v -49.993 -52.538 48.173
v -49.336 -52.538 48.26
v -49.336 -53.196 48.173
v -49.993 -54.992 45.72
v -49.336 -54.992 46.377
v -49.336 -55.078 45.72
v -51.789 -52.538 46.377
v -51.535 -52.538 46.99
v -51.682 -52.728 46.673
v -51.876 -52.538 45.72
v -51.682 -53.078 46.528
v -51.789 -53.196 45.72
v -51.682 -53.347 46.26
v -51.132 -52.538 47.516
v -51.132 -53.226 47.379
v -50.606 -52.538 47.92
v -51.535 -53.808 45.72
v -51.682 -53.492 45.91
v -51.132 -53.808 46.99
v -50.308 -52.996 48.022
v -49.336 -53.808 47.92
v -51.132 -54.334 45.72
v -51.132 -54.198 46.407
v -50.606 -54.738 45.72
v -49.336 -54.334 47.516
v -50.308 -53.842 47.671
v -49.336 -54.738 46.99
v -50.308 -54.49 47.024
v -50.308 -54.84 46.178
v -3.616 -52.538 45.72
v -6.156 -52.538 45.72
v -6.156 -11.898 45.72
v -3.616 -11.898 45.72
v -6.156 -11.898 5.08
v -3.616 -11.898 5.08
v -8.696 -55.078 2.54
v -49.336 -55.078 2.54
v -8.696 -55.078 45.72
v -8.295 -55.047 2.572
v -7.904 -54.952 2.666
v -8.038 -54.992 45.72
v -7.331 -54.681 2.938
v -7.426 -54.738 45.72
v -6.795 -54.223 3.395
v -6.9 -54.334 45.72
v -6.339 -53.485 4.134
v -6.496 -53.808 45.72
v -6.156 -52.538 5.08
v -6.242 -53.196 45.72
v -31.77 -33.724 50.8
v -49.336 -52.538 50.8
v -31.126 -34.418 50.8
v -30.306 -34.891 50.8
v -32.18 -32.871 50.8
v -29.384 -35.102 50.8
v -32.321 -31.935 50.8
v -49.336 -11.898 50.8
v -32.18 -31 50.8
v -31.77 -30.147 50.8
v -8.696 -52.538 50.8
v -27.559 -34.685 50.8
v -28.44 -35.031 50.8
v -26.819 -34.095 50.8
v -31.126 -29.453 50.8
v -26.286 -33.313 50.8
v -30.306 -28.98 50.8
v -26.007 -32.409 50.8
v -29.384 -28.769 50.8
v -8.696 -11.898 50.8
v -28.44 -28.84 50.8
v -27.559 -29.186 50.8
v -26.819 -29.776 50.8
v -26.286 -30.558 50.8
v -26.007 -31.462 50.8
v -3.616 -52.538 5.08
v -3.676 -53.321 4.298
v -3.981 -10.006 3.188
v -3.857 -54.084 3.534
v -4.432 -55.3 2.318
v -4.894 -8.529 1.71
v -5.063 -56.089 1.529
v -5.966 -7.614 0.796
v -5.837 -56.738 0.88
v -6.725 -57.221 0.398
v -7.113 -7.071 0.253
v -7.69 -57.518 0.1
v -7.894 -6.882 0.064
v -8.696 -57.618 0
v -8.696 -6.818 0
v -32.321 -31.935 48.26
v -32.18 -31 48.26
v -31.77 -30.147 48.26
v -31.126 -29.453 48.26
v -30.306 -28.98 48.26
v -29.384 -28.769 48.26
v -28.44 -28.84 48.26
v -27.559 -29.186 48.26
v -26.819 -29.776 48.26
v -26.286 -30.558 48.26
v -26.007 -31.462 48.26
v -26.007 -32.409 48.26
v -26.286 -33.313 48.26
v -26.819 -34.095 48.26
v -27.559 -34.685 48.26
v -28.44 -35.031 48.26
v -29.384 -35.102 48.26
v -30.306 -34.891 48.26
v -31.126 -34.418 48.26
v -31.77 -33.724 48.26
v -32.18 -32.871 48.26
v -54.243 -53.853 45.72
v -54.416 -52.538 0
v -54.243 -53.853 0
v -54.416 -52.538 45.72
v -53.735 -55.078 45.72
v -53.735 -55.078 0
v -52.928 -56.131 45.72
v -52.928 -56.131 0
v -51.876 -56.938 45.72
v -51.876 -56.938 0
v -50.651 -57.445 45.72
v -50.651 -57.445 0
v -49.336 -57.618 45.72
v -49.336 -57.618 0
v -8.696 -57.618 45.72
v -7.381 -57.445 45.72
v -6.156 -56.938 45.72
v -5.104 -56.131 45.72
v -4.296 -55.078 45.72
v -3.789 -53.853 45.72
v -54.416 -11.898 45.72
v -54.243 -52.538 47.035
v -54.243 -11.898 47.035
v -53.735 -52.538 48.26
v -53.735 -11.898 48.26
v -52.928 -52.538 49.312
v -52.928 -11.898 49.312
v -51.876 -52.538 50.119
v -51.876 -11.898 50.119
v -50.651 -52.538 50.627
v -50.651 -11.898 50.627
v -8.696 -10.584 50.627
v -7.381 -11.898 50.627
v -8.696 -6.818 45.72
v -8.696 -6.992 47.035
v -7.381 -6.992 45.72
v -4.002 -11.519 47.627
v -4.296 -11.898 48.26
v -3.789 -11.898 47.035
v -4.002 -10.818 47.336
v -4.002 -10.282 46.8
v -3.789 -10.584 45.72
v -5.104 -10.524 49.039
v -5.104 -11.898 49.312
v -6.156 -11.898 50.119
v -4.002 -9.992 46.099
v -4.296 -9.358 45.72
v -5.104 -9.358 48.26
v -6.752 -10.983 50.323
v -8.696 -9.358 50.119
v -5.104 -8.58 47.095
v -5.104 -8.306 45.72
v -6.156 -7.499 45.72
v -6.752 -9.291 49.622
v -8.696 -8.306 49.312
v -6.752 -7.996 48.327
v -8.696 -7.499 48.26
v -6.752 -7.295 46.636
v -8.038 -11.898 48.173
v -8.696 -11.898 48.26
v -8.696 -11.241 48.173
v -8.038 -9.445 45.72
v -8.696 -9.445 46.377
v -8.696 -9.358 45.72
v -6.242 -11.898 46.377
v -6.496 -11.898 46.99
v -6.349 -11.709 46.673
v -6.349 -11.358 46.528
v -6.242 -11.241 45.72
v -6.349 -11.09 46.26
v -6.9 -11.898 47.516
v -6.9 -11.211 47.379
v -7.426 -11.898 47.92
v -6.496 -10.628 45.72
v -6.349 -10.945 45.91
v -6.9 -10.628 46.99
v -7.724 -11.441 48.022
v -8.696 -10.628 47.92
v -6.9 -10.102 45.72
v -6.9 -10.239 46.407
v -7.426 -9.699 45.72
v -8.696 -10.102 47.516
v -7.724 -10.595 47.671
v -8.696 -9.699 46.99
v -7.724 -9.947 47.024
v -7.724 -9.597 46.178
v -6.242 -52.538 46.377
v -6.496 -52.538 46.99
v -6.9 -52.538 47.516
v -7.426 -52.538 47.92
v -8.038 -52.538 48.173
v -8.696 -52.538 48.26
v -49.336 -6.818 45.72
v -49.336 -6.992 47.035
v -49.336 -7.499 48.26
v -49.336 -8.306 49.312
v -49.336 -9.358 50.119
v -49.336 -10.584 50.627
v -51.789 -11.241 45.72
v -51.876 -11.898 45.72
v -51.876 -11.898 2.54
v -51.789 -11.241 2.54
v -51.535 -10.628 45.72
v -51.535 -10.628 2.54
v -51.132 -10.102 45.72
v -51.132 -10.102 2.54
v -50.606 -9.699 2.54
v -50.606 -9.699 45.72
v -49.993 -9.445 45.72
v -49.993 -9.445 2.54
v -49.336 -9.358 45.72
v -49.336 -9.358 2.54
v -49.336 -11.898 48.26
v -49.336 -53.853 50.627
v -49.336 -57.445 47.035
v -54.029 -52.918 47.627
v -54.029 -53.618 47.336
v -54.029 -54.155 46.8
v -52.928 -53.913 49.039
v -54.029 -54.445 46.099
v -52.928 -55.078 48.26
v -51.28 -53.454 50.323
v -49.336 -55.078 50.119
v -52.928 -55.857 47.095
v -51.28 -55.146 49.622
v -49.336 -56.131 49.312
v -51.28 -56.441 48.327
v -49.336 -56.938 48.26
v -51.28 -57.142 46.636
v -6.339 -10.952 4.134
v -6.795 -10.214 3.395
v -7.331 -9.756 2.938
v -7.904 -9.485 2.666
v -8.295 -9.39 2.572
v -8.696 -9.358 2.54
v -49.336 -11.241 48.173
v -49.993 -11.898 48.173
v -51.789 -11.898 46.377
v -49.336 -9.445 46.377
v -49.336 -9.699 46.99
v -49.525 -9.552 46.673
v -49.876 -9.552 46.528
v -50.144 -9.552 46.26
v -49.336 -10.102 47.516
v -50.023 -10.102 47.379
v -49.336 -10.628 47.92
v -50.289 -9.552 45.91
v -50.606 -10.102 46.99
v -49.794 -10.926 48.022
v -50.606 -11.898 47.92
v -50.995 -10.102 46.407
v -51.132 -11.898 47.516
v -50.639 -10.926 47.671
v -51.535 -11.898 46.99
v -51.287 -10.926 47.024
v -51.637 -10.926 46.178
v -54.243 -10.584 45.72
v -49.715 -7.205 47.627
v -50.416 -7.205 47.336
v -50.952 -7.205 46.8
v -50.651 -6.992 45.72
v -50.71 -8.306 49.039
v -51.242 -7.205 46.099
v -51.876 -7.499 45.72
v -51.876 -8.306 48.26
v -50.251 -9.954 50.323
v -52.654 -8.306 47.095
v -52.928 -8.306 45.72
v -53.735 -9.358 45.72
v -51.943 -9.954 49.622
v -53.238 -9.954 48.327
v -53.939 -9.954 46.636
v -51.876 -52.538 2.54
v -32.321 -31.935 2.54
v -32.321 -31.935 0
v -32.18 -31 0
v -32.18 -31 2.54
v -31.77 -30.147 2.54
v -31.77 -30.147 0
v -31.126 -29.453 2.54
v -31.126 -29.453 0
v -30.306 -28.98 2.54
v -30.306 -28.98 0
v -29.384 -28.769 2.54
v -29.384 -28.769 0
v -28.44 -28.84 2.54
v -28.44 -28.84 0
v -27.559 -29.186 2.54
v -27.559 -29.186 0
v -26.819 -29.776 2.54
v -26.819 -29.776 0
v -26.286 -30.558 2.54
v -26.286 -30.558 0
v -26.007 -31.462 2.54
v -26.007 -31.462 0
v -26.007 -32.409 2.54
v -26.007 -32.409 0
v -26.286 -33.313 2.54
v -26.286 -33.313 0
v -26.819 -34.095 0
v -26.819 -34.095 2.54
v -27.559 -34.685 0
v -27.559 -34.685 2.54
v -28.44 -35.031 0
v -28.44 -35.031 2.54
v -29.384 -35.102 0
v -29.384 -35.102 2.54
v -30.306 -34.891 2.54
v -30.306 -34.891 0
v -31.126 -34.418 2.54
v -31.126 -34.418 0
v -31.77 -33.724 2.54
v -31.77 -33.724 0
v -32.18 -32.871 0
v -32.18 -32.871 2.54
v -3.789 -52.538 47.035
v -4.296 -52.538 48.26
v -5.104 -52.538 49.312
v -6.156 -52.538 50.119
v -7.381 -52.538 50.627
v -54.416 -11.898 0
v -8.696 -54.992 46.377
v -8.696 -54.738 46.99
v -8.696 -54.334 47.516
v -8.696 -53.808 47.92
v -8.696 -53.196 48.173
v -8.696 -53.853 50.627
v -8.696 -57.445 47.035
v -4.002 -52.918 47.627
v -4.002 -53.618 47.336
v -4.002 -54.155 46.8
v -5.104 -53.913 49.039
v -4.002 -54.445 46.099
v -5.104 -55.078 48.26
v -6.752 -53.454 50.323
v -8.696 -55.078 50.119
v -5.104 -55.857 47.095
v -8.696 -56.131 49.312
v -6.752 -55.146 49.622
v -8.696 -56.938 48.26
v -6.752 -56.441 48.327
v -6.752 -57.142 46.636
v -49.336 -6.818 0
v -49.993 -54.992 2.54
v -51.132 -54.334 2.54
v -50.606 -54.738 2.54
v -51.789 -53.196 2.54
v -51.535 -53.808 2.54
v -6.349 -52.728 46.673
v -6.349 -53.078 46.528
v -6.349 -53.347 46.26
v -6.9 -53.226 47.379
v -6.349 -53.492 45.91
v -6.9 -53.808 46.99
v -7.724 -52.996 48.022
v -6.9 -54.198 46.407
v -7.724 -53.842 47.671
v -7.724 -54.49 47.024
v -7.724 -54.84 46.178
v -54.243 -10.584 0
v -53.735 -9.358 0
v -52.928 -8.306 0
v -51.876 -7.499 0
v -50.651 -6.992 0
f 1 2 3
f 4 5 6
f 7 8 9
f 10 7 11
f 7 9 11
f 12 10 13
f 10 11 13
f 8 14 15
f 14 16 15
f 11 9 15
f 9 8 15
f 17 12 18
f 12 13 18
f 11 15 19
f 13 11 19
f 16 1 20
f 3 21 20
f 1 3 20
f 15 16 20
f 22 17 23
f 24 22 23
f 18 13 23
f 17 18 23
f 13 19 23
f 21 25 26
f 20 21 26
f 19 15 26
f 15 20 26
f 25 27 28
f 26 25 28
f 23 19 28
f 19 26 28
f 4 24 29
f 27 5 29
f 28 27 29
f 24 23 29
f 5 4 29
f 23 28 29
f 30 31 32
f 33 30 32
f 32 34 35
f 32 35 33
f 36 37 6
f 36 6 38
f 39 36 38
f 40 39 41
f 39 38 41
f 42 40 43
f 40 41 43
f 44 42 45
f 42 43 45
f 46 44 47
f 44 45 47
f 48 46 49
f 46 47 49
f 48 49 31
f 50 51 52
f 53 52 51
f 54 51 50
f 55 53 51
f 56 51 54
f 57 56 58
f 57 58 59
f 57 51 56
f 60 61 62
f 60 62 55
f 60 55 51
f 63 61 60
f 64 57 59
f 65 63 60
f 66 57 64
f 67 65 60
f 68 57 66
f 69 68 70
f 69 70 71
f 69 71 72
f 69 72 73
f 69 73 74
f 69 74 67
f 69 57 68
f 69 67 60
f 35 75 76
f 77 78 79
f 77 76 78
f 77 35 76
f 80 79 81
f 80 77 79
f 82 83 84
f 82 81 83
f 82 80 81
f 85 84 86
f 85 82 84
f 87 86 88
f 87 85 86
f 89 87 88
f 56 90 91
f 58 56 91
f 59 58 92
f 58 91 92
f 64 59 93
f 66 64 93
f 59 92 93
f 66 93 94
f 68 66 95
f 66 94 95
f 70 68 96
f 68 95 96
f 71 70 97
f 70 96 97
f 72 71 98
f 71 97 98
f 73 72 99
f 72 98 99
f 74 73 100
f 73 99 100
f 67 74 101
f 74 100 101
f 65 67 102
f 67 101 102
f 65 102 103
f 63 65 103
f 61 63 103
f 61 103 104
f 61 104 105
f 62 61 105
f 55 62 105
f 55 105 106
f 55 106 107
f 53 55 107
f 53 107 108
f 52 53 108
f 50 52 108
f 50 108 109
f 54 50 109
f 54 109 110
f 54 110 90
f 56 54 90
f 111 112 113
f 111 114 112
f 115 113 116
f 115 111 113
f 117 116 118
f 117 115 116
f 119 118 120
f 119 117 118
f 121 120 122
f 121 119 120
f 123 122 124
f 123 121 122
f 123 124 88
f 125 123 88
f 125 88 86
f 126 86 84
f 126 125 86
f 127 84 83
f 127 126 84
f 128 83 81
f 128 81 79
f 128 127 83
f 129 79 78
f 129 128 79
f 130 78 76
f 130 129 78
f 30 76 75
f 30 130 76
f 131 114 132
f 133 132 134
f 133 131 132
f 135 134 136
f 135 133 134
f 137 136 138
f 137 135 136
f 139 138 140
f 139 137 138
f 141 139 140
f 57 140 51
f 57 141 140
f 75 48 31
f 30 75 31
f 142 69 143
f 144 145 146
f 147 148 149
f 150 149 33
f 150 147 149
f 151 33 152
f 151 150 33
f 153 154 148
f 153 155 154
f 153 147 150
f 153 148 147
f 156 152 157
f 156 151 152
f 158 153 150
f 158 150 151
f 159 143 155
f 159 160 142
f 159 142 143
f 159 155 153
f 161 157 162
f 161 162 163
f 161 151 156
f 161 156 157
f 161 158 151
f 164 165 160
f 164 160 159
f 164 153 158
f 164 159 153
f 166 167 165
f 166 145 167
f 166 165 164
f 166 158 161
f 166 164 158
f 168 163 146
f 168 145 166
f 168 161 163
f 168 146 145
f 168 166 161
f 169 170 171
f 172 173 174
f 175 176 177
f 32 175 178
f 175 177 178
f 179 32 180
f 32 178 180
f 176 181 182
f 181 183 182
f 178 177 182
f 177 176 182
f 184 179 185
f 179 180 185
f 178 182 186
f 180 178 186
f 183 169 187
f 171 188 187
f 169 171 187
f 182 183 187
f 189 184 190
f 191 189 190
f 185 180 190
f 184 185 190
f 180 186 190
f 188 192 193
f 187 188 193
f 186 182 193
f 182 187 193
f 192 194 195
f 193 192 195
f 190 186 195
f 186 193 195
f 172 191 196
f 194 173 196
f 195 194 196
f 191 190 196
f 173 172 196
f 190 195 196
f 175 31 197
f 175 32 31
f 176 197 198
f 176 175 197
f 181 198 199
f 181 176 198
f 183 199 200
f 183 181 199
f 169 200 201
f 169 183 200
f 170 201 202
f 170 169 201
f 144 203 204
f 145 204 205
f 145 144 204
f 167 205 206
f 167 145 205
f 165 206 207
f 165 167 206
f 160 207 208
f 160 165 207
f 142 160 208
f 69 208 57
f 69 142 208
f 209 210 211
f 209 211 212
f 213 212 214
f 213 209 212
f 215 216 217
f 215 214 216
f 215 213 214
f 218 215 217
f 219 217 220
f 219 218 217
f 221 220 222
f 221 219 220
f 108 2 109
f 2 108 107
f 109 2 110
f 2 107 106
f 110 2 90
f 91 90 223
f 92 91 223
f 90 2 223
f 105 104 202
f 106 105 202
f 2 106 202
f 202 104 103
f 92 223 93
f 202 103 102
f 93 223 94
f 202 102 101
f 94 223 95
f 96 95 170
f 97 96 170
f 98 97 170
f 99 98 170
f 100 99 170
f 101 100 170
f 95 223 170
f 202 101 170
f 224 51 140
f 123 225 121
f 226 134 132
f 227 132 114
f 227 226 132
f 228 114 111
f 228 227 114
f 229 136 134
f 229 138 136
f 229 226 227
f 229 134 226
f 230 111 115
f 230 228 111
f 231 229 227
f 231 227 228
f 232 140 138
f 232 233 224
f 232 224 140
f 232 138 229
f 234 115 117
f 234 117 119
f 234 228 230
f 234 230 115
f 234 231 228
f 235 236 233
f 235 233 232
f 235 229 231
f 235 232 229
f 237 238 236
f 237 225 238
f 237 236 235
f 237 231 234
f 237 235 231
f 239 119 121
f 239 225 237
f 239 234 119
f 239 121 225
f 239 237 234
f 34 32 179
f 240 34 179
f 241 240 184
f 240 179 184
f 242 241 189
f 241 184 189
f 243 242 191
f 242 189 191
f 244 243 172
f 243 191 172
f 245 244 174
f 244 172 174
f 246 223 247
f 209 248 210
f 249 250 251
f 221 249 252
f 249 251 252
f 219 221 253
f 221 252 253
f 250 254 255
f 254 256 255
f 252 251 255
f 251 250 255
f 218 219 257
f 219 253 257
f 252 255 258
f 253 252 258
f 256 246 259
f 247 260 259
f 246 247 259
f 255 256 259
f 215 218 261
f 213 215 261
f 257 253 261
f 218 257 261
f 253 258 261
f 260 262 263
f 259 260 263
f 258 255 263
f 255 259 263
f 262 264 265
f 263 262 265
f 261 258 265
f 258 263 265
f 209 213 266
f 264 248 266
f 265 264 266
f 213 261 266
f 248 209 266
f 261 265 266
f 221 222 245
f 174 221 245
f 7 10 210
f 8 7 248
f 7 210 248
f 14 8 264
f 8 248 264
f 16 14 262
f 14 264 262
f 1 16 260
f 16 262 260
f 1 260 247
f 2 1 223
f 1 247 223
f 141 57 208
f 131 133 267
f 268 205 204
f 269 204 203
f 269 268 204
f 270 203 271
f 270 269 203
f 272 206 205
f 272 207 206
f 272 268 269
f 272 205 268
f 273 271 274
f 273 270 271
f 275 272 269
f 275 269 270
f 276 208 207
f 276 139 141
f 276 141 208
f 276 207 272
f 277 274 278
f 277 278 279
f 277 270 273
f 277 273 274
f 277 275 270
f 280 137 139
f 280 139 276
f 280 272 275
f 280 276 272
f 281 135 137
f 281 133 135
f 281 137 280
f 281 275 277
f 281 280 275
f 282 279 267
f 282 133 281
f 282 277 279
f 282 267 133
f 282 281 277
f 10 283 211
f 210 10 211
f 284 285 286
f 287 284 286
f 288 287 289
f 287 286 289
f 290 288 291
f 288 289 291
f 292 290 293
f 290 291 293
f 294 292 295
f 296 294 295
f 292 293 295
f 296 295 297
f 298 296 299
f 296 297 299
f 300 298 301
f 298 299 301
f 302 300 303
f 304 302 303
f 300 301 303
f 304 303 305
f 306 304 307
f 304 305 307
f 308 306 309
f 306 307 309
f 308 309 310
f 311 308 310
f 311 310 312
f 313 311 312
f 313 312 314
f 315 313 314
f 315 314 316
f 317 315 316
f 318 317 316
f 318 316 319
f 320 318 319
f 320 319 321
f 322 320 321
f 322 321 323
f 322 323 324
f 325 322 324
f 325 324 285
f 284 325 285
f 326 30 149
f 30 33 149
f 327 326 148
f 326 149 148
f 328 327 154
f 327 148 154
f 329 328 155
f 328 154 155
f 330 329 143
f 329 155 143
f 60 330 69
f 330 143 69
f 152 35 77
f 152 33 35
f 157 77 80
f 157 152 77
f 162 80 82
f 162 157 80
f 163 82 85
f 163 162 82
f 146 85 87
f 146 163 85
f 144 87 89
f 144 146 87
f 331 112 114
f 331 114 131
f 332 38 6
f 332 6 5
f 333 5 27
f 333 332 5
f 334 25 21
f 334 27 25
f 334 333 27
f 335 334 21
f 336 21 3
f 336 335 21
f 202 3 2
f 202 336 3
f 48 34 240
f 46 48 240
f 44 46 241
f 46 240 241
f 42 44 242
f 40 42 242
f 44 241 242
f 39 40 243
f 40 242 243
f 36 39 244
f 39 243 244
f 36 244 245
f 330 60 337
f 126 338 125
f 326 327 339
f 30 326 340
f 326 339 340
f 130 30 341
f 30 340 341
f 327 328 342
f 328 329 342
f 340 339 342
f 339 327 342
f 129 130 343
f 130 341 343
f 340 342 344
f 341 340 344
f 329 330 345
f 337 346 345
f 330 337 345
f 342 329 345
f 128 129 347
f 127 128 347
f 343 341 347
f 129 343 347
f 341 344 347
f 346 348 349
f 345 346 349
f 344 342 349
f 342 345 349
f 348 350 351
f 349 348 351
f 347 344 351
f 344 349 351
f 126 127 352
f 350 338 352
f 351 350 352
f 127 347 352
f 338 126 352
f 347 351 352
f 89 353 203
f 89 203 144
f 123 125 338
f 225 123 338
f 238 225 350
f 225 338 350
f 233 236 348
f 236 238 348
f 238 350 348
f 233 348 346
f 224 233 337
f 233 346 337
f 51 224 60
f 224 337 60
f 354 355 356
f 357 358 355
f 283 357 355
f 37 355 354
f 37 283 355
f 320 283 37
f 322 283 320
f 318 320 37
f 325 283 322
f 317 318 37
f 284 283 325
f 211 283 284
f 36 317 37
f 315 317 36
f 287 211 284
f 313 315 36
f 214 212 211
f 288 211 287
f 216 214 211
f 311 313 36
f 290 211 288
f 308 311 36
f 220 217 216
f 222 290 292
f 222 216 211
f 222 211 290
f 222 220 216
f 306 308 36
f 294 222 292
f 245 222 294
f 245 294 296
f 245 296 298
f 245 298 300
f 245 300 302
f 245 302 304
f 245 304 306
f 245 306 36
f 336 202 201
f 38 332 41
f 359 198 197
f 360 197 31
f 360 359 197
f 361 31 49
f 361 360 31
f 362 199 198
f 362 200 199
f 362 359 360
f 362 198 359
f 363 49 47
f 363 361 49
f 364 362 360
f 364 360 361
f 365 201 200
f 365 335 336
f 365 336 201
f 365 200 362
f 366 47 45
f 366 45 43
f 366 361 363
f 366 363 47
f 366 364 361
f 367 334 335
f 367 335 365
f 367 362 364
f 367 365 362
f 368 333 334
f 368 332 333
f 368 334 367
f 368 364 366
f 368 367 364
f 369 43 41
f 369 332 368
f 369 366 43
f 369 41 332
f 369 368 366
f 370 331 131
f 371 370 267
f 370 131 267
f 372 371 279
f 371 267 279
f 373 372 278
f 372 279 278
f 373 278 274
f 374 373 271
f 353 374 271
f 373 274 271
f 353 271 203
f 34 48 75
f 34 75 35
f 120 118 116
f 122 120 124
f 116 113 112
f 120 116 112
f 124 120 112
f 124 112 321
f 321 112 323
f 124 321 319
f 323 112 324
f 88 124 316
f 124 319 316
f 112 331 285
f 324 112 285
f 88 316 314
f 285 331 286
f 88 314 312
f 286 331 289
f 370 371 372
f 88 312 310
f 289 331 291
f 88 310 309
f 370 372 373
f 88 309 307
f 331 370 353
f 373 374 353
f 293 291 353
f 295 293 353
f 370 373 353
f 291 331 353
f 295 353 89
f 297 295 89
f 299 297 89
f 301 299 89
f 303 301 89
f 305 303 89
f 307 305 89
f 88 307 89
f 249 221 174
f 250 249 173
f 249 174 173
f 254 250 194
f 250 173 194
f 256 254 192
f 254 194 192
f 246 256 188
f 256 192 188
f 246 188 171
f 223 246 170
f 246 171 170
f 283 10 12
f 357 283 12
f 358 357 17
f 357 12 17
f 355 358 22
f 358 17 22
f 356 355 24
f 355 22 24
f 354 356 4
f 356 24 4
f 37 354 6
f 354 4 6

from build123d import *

# Parameters (mm, degrees)
F0_W     = 50.8
F0_H     = 50.8
F1_DEPTH = 50.8
F3_R     = 5.08
F5_T     = -2.54
F7_D     = 6.35


# Not quite as in the source:
# - a shell that OpenCascade refuses in one call is made with other operations: the cavity is built on its own and cut out


with BuildPart() as f1:
    # F0 (on Top) → F1 (new body)
    with BuildSketch(Plane.XY):
        with Locations((-29.015717721, -32.2184429228)):
            Rectangle(F0_W, F0_H)
    extrude(amount=F1_DEPTH)

    # F3
    f3_edges = [f1.edges().sort_by_distance(p)[0] for p in [
        (-29.015718, -57.618443, 50.8),
        (-54.415718, -32.218443, 50.8),
        (-29.015718, -6.818443, 50.8),
        (-3.615718, -32.218443, 50.8),
        (-54.415718, -57.618443, 25.4),
        (-54.415718, -6.818443, 25.4),
        (-3.615718, -6.818443, 25.4),
        (-3.615718, -57.618443, 25.4),
        (-3.615718, -32.218443, 0),
    ]]
    fillet(f3_edges, radius=F3_R)

    # F5: a shell. OpenCascade refuses it in one call, so the cavity is built on its own and cut out:
    # the body offset inwards by the wall thickness, plus a prism from it out through each open face.
    f5_core = offset(f1.part, amount=F5_T, mode=Mode.PRIVATE)
    f5_exits = [f5_core.faces().sort_by_distance(p)[0] for p in [
        (-6.155718, -32.218443, 25.4),
    ]]
    add(f5_core, mode=Mode.SUBTRACT)
    extrude(f5_exits, amount=-F5_T, mode=Mode.SUBTRACT)

    # F7 (through all)
    with Locations(Plane.XY.offset(50.8)):
        with Locations((-29.1464701295, -31.9354347885)):
            Hole(F7_D / 2)


solid = f1.part
